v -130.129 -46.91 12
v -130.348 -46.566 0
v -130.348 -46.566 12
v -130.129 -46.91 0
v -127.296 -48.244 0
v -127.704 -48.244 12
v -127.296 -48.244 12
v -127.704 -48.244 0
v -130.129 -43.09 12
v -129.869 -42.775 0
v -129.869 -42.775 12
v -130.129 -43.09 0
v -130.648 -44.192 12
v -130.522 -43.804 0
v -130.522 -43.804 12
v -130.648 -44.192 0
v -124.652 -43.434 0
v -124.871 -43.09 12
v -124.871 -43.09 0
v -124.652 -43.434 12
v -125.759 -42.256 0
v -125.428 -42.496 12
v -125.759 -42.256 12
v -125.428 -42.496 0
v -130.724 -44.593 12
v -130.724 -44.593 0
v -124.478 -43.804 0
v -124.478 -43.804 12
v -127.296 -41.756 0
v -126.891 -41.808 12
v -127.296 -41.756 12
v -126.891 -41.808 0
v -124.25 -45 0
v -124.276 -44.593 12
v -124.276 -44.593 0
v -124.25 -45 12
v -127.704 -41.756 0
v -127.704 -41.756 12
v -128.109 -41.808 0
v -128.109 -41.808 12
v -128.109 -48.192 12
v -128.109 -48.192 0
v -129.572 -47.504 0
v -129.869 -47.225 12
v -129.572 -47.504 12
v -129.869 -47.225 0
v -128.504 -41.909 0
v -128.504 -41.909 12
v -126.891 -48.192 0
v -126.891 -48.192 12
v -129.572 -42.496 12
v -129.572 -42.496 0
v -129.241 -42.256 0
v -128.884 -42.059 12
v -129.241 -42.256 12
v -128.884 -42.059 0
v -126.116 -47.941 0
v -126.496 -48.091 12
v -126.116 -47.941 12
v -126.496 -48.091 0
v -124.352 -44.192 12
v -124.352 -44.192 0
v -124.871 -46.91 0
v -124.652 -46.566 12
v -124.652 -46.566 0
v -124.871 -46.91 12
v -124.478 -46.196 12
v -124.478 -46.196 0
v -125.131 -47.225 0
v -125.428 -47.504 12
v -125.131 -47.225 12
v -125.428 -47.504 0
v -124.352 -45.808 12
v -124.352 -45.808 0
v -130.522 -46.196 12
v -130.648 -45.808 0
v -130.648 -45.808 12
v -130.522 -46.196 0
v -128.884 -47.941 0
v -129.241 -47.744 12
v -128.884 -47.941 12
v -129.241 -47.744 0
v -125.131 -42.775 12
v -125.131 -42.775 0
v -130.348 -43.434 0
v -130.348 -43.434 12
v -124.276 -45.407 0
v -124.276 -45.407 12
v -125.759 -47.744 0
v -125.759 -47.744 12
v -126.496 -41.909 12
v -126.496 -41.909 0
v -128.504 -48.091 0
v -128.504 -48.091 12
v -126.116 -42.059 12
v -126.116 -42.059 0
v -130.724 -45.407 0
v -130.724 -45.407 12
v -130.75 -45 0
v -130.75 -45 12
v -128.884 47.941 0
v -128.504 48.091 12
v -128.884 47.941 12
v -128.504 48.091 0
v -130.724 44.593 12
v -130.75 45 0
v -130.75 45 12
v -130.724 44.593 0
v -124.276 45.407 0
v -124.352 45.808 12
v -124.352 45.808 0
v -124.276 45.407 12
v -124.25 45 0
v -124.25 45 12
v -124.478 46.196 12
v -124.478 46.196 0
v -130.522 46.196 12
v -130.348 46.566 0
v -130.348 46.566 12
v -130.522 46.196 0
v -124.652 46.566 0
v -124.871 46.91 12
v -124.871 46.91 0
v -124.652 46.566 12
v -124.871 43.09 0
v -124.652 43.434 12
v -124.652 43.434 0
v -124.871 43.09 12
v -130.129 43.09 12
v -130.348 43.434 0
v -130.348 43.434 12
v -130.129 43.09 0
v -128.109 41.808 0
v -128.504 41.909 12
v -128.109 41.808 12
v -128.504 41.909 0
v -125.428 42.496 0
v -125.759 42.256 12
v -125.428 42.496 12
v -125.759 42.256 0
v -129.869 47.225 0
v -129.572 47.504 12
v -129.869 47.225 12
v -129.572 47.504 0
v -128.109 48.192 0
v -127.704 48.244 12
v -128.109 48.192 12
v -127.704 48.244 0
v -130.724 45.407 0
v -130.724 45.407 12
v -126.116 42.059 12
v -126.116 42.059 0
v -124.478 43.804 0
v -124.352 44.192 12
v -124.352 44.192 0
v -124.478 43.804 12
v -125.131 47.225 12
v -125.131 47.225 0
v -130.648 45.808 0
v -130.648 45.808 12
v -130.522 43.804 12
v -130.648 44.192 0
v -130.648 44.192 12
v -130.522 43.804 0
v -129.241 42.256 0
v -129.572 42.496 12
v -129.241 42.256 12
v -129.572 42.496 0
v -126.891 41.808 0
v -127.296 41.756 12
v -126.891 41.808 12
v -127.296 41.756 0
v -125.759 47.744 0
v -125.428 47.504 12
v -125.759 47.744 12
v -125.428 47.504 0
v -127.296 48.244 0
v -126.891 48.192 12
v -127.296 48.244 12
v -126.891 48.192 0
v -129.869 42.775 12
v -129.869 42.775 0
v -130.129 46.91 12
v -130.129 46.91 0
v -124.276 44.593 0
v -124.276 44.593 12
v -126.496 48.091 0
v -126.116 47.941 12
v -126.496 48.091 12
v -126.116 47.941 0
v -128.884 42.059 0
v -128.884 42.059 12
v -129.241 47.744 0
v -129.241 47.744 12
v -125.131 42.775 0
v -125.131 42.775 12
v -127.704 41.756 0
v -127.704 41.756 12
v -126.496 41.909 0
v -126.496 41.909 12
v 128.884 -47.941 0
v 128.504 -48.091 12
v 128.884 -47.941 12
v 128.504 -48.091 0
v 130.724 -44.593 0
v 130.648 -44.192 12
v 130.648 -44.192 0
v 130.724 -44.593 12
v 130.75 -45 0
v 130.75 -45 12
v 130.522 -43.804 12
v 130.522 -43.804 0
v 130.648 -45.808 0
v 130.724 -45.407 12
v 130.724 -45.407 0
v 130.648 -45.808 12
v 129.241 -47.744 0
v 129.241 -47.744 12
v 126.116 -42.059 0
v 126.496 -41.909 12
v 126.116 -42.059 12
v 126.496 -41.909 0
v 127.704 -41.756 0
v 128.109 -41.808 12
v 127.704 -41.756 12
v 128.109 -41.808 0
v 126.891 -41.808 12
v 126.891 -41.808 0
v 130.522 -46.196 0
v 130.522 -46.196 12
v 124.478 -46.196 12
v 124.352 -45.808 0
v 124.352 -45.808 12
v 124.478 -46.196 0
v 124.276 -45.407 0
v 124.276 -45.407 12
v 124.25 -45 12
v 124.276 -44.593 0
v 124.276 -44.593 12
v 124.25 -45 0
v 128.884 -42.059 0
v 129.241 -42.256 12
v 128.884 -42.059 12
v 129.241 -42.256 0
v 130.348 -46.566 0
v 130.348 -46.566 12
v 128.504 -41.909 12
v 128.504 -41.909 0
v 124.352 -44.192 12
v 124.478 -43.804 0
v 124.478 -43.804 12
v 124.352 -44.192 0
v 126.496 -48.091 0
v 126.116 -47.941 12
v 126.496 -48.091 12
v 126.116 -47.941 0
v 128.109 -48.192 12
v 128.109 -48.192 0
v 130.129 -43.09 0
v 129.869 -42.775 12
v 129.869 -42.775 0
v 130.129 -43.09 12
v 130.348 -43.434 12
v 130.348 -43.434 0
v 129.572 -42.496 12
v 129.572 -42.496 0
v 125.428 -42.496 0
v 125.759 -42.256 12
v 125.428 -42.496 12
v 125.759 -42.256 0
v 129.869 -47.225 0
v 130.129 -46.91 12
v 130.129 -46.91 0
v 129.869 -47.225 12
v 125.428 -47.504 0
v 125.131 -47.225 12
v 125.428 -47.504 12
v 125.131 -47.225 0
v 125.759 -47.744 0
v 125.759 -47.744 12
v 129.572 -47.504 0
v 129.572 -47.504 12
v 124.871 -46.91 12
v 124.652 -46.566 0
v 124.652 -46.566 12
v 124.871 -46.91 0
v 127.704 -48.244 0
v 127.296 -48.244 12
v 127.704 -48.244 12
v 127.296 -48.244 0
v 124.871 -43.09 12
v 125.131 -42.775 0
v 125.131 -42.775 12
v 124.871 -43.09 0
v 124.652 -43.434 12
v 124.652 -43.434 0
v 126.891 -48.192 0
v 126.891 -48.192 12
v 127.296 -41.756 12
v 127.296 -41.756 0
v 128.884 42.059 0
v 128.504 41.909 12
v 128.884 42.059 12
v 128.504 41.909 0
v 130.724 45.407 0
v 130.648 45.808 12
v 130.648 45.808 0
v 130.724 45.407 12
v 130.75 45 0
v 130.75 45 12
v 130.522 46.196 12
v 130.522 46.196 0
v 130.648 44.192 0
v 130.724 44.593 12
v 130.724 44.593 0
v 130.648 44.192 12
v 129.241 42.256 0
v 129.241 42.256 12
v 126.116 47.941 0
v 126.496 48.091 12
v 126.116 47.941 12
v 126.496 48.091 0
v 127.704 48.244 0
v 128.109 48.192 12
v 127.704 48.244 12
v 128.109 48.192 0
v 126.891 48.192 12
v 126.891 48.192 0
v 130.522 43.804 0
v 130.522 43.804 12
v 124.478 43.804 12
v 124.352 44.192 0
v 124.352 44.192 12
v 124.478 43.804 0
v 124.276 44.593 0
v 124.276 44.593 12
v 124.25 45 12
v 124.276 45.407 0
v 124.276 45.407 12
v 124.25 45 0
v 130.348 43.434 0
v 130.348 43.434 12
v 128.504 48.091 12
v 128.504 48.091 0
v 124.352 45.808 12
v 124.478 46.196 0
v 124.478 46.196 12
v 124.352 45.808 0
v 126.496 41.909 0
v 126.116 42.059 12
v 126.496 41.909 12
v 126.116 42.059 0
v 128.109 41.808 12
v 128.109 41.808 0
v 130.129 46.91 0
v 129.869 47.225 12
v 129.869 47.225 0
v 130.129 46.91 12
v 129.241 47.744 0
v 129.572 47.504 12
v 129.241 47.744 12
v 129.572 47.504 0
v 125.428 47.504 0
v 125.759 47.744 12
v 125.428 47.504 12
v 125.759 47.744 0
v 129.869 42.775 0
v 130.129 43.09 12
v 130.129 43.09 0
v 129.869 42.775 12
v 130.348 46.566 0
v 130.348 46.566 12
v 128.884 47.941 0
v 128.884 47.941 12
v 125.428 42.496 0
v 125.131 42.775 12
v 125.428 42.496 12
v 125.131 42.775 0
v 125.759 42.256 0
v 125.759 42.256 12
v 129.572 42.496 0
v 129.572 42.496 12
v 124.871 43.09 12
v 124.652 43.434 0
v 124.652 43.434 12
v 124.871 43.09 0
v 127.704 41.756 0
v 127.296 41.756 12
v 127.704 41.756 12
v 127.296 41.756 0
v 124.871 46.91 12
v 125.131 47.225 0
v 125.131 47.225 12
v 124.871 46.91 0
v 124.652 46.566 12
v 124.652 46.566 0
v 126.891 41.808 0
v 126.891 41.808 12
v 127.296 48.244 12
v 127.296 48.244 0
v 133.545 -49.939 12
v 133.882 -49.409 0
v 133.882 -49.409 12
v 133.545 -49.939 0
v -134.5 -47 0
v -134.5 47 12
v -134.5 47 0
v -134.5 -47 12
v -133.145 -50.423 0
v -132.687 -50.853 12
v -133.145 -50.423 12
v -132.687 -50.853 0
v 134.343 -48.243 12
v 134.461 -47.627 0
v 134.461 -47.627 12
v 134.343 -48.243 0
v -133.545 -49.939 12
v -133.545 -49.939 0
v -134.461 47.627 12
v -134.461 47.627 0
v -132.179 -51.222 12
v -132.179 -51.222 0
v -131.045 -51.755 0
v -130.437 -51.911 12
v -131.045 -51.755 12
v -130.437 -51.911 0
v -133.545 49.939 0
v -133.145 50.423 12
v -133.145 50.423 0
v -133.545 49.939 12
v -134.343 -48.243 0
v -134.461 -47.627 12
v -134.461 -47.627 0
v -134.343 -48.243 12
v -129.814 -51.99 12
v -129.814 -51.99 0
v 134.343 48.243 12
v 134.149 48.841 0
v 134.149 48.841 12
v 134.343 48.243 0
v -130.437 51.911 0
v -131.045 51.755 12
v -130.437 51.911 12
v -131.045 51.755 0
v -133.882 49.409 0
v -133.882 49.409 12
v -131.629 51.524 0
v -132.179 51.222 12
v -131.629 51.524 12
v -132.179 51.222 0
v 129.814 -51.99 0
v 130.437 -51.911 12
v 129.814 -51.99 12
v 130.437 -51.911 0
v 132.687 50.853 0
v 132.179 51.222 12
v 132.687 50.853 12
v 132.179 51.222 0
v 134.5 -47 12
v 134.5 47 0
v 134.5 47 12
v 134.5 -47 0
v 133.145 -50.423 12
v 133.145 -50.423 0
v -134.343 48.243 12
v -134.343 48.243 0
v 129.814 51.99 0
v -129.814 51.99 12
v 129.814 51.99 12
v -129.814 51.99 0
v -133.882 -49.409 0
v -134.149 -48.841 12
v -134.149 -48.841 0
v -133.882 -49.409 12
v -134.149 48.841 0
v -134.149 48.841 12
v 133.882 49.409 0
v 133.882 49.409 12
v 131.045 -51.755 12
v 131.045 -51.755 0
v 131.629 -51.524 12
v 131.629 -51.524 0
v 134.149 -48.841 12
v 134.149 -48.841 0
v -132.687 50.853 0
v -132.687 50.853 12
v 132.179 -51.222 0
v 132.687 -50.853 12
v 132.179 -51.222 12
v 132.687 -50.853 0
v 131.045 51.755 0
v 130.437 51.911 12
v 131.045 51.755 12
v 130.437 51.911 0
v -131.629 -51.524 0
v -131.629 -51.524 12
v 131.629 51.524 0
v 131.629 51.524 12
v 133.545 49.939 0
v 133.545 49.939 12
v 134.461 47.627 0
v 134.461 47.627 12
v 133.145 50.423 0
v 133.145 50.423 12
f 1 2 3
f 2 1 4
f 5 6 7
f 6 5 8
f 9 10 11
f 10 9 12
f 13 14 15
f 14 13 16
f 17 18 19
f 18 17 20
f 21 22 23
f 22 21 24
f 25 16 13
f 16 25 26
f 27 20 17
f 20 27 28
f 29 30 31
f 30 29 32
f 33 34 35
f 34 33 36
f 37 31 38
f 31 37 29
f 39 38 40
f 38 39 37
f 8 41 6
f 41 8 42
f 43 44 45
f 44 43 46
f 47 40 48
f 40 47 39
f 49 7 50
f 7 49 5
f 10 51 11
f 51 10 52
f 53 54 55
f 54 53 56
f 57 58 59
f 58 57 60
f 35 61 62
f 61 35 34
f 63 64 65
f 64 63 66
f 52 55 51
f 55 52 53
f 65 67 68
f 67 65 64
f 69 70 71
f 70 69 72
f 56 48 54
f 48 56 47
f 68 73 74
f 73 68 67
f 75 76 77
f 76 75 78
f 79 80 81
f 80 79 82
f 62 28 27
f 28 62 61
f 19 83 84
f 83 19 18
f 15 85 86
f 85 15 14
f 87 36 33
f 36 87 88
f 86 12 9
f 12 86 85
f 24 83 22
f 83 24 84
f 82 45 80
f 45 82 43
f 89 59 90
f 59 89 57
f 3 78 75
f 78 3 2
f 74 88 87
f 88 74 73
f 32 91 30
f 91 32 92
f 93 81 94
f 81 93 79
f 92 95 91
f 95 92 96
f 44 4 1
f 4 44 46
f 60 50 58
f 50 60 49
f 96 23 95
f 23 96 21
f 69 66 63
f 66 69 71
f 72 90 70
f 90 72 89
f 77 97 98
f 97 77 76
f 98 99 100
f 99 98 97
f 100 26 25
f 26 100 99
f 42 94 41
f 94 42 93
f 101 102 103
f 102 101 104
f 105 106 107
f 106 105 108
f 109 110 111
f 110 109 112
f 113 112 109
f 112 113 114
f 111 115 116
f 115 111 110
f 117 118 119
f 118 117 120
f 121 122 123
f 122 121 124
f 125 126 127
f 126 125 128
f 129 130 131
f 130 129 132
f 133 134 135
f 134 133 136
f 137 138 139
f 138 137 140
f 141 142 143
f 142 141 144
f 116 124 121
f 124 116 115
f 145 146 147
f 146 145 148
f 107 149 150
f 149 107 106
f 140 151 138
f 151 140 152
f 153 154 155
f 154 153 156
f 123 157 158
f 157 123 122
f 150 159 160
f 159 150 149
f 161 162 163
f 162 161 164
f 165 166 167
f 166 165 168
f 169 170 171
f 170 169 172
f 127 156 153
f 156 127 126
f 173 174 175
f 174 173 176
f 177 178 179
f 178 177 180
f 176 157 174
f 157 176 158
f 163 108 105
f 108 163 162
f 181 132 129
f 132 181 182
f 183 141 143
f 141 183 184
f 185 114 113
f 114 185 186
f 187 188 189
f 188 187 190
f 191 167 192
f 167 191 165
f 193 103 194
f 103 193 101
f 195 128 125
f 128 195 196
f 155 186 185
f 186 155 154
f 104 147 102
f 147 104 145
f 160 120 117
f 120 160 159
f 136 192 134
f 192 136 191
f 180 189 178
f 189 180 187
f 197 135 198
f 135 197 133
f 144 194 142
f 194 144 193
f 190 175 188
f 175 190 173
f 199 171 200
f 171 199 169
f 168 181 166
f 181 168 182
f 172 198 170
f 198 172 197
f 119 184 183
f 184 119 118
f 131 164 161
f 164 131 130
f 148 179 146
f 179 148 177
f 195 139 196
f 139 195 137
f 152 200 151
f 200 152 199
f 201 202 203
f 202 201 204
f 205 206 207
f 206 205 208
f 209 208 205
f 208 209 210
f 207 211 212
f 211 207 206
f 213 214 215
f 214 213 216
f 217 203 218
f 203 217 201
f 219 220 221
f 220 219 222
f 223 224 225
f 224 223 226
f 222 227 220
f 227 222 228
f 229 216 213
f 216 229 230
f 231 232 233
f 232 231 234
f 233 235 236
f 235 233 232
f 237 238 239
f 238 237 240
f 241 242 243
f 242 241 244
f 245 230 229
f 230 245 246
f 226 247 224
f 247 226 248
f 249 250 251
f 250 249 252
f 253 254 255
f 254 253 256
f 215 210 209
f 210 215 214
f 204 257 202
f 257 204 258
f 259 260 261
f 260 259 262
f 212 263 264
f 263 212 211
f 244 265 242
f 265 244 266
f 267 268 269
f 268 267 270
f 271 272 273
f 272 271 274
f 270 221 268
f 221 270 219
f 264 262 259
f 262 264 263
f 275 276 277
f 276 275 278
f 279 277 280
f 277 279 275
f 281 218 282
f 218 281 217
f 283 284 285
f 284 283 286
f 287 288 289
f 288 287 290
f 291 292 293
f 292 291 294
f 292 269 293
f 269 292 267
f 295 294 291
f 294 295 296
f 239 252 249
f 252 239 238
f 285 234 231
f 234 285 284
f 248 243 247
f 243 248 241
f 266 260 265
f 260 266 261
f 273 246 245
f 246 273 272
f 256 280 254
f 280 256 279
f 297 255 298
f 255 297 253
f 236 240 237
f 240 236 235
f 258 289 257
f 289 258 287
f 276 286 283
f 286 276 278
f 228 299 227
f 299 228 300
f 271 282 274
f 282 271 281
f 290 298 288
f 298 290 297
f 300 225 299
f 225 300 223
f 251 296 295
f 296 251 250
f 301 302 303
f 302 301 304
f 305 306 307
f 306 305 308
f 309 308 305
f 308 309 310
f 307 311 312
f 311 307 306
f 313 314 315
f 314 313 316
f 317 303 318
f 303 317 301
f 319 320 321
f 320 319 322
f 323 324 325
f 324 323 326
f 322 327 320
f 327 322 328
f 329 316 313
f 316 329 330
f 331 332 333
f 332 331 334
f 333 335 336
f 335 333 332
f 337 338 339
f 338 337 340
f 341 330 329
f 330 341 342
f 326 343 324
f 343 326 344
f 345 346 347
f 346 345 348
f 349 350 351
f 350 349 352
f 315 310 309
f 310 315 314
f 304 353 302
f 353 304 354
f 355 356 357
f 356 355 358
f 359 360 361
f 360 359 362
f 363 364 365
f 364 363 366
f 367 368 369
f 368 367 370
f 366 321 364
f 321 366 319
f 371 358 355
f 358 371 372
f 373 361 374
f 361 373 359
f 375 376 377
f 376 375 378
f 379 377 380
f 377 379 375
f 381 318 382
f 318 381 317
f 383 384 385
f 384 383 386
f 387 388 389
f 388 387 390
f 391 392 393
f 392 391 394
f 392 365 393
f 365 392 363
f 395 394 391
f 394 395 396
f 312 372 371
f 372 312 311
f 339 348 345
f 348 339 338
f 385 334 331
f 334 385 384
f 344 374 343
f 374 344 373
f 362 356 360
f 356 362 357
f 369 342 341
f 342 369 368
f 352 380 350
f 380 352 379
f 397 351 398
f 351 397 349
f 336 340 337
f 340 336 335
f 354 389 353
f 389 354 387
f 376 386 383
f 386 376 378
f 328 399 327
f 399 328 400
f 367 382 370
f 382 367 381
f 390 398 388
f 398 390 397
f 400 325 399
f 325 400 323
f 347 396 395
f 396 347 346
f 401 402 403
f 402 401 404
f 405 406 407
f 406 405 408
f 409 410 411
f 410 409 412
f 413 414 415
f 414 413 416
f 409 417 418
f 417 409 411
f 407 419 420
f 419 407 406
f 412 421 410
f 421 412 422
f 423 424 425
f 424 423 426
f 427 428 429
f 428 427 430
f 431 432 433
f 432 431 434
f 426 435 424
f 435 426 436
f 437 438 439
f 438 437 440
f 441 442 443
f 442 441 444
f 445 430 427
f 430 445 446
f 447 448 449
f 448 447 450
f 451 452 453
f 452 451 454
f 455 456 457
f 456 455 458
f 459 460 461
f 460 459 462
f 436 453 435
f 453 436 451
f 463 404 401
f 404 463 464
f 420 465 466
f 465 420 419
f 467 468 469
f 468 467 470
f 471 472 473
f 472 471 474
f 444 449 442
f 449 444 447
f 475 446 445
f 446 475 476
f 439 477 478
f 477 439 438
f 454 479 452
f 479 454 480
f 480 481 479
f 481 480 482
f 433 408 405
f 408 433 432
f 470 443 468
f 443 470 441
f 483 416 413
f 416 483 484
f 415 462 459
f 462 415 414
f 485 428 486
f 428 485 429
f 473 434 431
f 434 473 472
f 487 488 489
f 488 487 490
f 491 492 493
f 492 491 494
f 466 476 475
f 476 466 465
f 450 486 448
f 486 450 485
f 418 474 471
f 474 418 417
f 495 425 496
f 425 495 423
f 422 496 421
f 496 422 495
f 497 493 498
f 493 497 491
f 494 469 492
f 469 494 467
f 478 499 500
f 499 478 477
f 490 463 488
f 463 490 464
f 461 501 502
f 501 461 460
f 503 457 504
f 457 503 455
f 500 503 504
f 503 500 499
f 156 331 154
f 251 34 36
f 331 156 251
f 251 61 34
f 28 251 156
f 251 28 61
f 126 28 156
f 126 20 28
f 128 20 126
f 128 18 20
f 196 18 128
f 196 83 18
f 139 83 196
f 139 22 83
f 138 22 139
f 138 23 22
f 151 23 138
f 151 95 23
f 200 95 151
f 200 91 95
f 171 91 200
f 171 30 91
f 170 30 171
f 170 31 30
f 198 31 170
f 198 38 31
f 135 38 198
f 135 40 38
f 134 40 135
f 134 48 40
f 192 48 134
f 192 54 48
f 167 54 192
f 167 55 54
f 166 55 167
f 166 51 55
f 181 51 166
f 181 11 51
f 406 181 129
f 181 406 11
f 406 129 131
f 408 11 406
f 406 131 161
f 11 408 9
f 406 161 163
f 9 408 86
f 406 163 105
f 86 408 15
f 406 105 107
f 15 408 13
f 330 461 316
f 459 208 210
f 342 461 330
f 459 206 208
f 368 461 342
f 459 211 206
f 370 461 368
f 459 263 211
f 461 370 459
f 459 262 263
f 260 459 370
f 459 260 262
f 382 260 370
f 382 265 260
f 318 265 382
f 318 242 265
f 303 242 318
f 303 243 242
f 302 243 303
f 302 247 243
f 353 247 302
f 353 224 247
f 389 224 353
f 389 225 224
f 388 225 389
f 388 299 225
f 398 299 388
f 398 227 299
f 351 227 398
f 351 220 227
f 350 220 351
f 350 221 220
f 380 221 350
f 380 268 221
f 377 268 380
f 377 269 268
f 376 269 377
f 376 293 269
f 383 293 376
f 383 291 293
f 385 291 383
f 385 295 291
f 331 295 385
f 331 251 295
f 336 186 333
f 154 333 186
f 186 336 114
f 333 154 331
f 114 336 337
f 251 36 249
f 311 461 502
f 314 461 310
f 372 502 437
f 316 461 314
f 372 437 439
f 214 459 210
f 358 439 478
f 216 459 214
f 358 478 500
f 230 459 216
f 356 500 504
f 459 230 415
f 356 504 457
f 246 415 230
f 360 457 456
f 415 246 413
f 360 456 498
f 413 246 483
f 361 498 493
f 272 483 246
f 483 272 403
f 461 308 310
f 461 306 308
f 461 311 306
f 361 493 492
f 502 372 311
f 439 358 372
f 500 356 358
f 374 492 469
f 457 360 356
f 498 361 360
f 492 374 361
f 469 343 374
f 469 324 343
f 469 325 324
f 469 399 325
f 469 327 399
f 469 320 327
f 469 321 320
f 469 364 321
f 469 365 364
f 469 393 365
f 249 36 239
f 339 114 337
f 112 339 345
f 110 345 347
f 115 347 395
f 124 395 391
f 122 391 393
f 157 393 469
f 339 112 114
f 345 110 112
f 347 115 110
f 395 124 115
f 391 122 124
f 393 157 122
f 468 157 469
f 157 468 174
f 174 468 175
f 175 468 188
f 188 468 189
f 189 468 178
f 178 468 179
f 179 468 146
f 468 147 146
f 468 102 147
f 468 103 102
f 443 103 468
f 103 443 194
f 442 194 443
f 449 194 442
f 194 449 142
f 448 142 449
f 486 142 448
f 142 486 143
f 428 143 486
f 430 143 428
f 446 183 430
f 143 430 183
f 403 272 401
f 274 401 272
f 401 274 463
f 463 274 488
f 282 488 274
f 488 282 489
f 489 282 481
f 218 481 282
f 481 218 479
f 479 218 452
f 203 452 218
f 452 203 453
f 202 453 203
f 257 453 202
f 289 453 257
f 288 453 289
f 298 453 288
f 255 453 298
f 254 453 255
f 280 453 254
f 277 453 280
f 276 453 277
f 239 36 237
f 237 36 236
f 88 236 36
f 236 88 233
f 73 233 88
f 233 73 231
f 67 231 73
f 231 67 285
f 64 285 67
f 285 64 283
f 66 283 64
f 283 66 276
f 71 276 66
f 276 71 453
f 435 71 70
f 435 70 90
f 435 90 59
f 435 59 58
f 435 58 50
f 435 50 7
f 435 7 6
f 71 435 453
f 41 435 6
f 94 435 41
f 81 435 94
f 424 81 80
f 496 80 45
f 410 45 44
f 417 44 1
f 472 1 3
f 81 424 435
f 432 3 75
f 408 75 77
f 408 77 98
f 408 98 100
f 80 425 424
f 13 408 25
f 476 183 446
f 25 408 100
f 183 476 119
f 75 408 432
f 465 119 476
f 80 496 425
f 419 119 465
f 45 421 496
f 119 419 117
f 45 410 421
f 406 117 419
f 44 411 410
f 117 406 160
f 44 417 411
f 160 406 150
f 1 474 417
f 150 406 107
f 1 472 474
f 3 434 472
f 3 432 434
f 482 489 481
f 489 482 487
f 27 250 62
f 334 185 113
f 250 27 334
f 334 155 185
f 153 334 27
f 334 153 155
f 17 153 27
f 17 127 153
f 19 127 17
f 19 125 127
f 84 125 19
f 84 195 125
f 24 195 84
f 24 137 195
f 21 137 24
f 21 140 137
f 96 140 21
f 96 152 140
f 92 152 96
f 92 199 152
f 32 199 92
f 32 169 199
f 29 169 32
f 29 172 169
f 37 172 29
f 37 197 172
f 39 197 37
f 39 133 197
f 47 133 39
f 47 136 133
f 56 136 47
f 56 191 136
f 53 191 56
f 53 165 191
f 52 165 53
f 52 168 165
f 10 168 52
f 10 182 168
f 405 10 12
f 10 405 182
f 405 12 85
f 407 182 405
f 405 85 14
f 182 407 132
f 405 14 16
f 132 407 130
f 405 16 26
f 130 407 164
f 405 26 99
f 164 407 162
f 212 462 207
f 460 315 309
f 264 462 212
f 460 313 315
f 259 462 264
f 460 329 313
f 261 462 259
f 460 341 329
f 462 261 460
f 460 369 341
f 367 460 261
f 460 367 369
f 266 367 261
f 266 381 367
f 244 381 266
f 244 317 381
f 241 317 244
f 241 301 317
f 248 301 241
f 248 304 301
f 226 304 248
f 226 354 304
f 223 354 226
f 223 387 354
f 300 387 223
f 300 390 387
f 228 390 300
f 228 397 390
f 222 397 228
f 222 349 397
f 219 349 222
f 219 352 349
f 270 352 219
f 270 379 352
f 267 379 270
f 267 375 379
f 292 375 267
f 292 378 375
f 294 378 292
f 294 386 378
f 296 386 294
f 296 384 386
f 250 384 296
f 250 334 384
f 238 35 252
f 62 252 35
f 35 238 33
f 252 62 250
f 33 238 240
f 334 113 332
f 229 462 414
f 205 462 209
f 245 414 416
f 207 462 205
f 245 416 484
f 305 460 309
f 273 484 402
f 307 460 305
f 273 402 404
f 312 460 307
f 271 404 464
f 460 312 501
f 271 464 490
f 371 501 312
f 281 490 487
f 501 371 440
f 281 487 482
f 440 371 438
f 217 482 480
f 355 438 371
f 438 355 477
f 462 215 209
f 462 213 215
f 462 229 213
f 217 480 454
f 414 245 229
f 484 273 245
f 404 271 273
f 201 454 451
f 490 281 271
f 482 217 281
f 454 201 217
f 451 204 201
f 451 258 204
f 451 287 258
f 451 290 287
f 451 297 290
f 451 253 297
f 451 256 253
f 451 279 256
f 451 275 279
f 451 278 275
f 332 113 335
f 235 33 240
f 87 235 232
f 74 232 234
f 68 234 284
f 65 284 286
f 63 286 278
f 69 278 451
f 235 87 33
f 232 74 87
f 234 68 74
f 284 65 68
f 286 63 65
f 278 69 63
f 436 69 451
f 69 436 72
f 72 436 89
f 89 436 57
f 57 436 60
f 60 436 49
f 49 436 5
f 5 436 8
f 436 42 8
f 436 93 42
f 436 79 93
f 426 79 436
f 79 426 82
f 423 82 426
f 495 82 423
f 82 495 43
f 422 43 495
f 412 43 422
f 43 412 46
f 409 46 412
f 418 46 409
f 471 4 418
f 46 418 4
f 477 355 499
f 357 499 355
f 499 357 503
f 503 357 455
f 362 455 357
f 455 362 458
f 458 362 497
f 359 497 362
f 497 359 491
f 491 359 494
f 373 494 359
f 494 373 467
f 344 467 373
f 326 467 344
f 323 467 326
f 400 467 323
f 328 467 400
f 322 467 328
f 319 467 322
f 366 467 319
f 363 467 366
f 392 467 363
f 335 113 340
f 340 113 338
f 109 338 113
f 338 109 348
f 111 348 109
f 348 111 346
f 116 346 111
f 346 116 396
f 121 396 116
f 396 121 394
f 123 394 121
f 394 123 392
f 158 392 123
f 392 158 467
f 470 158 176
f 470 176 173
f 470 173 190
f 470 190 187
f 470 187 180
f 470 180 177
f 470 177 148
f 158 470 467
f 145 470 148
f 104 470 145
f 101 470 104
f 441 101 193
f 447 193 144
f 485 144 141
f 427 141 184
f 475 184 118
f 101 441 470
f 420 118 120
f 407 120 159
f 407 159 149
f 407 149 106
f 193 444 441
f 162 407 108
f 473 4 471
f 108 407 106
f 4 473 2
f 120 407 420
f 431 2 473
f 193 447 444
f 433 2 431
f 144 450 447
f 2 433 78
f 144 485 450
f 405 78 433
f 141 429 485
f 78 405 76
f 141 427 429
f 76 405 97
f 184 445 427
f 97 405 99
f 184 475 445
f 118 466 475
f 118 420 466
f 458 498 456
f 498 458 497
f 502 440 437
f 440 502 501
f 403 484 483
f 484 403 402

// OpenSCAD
$fn = 50;


difference() {
	union() {
		hull() {
			translate(v = [-129.5000000000, 47.0000000000, 0]) {
				cylinder(h = 12, r = 5);
			}
			translate(v = [129.5000000000, 47.0000000000, 0]) {
				cylinder(h = 12, r = 5);
			}
			translate(v = [-129.5000000000, -47.0000000000, 0]) {
				cylinder(h = 12, r = 5);
			}
			translate(v = [129.5000000000, -47.0000000000, 0]) {
				cylinder(h = 12, r = 5);
			}
		}
	}
	union() {
		translate(v = [-127.5000000000, -45.0000000000, -100.0000000000]) {
			cylinder(h = 200, r = 3.2500000000);
		}
		translate(v = [-127.5000000000, 45.0000000000, -100.0000000000]) {
			cylinder(h = 200, r = 3.2500000000);
		}
		translate(v = [127.5000000000, -45.0000000000, -100.0000000000]) {
			cylinder(h = 200, r = 3.2500000000);
		}
		translate(v = [127.5000000000, 45.0000000000, -100.0000000000]) {
			cylinder(h = 200, r = 3.2500000000);
		}
	}
}
